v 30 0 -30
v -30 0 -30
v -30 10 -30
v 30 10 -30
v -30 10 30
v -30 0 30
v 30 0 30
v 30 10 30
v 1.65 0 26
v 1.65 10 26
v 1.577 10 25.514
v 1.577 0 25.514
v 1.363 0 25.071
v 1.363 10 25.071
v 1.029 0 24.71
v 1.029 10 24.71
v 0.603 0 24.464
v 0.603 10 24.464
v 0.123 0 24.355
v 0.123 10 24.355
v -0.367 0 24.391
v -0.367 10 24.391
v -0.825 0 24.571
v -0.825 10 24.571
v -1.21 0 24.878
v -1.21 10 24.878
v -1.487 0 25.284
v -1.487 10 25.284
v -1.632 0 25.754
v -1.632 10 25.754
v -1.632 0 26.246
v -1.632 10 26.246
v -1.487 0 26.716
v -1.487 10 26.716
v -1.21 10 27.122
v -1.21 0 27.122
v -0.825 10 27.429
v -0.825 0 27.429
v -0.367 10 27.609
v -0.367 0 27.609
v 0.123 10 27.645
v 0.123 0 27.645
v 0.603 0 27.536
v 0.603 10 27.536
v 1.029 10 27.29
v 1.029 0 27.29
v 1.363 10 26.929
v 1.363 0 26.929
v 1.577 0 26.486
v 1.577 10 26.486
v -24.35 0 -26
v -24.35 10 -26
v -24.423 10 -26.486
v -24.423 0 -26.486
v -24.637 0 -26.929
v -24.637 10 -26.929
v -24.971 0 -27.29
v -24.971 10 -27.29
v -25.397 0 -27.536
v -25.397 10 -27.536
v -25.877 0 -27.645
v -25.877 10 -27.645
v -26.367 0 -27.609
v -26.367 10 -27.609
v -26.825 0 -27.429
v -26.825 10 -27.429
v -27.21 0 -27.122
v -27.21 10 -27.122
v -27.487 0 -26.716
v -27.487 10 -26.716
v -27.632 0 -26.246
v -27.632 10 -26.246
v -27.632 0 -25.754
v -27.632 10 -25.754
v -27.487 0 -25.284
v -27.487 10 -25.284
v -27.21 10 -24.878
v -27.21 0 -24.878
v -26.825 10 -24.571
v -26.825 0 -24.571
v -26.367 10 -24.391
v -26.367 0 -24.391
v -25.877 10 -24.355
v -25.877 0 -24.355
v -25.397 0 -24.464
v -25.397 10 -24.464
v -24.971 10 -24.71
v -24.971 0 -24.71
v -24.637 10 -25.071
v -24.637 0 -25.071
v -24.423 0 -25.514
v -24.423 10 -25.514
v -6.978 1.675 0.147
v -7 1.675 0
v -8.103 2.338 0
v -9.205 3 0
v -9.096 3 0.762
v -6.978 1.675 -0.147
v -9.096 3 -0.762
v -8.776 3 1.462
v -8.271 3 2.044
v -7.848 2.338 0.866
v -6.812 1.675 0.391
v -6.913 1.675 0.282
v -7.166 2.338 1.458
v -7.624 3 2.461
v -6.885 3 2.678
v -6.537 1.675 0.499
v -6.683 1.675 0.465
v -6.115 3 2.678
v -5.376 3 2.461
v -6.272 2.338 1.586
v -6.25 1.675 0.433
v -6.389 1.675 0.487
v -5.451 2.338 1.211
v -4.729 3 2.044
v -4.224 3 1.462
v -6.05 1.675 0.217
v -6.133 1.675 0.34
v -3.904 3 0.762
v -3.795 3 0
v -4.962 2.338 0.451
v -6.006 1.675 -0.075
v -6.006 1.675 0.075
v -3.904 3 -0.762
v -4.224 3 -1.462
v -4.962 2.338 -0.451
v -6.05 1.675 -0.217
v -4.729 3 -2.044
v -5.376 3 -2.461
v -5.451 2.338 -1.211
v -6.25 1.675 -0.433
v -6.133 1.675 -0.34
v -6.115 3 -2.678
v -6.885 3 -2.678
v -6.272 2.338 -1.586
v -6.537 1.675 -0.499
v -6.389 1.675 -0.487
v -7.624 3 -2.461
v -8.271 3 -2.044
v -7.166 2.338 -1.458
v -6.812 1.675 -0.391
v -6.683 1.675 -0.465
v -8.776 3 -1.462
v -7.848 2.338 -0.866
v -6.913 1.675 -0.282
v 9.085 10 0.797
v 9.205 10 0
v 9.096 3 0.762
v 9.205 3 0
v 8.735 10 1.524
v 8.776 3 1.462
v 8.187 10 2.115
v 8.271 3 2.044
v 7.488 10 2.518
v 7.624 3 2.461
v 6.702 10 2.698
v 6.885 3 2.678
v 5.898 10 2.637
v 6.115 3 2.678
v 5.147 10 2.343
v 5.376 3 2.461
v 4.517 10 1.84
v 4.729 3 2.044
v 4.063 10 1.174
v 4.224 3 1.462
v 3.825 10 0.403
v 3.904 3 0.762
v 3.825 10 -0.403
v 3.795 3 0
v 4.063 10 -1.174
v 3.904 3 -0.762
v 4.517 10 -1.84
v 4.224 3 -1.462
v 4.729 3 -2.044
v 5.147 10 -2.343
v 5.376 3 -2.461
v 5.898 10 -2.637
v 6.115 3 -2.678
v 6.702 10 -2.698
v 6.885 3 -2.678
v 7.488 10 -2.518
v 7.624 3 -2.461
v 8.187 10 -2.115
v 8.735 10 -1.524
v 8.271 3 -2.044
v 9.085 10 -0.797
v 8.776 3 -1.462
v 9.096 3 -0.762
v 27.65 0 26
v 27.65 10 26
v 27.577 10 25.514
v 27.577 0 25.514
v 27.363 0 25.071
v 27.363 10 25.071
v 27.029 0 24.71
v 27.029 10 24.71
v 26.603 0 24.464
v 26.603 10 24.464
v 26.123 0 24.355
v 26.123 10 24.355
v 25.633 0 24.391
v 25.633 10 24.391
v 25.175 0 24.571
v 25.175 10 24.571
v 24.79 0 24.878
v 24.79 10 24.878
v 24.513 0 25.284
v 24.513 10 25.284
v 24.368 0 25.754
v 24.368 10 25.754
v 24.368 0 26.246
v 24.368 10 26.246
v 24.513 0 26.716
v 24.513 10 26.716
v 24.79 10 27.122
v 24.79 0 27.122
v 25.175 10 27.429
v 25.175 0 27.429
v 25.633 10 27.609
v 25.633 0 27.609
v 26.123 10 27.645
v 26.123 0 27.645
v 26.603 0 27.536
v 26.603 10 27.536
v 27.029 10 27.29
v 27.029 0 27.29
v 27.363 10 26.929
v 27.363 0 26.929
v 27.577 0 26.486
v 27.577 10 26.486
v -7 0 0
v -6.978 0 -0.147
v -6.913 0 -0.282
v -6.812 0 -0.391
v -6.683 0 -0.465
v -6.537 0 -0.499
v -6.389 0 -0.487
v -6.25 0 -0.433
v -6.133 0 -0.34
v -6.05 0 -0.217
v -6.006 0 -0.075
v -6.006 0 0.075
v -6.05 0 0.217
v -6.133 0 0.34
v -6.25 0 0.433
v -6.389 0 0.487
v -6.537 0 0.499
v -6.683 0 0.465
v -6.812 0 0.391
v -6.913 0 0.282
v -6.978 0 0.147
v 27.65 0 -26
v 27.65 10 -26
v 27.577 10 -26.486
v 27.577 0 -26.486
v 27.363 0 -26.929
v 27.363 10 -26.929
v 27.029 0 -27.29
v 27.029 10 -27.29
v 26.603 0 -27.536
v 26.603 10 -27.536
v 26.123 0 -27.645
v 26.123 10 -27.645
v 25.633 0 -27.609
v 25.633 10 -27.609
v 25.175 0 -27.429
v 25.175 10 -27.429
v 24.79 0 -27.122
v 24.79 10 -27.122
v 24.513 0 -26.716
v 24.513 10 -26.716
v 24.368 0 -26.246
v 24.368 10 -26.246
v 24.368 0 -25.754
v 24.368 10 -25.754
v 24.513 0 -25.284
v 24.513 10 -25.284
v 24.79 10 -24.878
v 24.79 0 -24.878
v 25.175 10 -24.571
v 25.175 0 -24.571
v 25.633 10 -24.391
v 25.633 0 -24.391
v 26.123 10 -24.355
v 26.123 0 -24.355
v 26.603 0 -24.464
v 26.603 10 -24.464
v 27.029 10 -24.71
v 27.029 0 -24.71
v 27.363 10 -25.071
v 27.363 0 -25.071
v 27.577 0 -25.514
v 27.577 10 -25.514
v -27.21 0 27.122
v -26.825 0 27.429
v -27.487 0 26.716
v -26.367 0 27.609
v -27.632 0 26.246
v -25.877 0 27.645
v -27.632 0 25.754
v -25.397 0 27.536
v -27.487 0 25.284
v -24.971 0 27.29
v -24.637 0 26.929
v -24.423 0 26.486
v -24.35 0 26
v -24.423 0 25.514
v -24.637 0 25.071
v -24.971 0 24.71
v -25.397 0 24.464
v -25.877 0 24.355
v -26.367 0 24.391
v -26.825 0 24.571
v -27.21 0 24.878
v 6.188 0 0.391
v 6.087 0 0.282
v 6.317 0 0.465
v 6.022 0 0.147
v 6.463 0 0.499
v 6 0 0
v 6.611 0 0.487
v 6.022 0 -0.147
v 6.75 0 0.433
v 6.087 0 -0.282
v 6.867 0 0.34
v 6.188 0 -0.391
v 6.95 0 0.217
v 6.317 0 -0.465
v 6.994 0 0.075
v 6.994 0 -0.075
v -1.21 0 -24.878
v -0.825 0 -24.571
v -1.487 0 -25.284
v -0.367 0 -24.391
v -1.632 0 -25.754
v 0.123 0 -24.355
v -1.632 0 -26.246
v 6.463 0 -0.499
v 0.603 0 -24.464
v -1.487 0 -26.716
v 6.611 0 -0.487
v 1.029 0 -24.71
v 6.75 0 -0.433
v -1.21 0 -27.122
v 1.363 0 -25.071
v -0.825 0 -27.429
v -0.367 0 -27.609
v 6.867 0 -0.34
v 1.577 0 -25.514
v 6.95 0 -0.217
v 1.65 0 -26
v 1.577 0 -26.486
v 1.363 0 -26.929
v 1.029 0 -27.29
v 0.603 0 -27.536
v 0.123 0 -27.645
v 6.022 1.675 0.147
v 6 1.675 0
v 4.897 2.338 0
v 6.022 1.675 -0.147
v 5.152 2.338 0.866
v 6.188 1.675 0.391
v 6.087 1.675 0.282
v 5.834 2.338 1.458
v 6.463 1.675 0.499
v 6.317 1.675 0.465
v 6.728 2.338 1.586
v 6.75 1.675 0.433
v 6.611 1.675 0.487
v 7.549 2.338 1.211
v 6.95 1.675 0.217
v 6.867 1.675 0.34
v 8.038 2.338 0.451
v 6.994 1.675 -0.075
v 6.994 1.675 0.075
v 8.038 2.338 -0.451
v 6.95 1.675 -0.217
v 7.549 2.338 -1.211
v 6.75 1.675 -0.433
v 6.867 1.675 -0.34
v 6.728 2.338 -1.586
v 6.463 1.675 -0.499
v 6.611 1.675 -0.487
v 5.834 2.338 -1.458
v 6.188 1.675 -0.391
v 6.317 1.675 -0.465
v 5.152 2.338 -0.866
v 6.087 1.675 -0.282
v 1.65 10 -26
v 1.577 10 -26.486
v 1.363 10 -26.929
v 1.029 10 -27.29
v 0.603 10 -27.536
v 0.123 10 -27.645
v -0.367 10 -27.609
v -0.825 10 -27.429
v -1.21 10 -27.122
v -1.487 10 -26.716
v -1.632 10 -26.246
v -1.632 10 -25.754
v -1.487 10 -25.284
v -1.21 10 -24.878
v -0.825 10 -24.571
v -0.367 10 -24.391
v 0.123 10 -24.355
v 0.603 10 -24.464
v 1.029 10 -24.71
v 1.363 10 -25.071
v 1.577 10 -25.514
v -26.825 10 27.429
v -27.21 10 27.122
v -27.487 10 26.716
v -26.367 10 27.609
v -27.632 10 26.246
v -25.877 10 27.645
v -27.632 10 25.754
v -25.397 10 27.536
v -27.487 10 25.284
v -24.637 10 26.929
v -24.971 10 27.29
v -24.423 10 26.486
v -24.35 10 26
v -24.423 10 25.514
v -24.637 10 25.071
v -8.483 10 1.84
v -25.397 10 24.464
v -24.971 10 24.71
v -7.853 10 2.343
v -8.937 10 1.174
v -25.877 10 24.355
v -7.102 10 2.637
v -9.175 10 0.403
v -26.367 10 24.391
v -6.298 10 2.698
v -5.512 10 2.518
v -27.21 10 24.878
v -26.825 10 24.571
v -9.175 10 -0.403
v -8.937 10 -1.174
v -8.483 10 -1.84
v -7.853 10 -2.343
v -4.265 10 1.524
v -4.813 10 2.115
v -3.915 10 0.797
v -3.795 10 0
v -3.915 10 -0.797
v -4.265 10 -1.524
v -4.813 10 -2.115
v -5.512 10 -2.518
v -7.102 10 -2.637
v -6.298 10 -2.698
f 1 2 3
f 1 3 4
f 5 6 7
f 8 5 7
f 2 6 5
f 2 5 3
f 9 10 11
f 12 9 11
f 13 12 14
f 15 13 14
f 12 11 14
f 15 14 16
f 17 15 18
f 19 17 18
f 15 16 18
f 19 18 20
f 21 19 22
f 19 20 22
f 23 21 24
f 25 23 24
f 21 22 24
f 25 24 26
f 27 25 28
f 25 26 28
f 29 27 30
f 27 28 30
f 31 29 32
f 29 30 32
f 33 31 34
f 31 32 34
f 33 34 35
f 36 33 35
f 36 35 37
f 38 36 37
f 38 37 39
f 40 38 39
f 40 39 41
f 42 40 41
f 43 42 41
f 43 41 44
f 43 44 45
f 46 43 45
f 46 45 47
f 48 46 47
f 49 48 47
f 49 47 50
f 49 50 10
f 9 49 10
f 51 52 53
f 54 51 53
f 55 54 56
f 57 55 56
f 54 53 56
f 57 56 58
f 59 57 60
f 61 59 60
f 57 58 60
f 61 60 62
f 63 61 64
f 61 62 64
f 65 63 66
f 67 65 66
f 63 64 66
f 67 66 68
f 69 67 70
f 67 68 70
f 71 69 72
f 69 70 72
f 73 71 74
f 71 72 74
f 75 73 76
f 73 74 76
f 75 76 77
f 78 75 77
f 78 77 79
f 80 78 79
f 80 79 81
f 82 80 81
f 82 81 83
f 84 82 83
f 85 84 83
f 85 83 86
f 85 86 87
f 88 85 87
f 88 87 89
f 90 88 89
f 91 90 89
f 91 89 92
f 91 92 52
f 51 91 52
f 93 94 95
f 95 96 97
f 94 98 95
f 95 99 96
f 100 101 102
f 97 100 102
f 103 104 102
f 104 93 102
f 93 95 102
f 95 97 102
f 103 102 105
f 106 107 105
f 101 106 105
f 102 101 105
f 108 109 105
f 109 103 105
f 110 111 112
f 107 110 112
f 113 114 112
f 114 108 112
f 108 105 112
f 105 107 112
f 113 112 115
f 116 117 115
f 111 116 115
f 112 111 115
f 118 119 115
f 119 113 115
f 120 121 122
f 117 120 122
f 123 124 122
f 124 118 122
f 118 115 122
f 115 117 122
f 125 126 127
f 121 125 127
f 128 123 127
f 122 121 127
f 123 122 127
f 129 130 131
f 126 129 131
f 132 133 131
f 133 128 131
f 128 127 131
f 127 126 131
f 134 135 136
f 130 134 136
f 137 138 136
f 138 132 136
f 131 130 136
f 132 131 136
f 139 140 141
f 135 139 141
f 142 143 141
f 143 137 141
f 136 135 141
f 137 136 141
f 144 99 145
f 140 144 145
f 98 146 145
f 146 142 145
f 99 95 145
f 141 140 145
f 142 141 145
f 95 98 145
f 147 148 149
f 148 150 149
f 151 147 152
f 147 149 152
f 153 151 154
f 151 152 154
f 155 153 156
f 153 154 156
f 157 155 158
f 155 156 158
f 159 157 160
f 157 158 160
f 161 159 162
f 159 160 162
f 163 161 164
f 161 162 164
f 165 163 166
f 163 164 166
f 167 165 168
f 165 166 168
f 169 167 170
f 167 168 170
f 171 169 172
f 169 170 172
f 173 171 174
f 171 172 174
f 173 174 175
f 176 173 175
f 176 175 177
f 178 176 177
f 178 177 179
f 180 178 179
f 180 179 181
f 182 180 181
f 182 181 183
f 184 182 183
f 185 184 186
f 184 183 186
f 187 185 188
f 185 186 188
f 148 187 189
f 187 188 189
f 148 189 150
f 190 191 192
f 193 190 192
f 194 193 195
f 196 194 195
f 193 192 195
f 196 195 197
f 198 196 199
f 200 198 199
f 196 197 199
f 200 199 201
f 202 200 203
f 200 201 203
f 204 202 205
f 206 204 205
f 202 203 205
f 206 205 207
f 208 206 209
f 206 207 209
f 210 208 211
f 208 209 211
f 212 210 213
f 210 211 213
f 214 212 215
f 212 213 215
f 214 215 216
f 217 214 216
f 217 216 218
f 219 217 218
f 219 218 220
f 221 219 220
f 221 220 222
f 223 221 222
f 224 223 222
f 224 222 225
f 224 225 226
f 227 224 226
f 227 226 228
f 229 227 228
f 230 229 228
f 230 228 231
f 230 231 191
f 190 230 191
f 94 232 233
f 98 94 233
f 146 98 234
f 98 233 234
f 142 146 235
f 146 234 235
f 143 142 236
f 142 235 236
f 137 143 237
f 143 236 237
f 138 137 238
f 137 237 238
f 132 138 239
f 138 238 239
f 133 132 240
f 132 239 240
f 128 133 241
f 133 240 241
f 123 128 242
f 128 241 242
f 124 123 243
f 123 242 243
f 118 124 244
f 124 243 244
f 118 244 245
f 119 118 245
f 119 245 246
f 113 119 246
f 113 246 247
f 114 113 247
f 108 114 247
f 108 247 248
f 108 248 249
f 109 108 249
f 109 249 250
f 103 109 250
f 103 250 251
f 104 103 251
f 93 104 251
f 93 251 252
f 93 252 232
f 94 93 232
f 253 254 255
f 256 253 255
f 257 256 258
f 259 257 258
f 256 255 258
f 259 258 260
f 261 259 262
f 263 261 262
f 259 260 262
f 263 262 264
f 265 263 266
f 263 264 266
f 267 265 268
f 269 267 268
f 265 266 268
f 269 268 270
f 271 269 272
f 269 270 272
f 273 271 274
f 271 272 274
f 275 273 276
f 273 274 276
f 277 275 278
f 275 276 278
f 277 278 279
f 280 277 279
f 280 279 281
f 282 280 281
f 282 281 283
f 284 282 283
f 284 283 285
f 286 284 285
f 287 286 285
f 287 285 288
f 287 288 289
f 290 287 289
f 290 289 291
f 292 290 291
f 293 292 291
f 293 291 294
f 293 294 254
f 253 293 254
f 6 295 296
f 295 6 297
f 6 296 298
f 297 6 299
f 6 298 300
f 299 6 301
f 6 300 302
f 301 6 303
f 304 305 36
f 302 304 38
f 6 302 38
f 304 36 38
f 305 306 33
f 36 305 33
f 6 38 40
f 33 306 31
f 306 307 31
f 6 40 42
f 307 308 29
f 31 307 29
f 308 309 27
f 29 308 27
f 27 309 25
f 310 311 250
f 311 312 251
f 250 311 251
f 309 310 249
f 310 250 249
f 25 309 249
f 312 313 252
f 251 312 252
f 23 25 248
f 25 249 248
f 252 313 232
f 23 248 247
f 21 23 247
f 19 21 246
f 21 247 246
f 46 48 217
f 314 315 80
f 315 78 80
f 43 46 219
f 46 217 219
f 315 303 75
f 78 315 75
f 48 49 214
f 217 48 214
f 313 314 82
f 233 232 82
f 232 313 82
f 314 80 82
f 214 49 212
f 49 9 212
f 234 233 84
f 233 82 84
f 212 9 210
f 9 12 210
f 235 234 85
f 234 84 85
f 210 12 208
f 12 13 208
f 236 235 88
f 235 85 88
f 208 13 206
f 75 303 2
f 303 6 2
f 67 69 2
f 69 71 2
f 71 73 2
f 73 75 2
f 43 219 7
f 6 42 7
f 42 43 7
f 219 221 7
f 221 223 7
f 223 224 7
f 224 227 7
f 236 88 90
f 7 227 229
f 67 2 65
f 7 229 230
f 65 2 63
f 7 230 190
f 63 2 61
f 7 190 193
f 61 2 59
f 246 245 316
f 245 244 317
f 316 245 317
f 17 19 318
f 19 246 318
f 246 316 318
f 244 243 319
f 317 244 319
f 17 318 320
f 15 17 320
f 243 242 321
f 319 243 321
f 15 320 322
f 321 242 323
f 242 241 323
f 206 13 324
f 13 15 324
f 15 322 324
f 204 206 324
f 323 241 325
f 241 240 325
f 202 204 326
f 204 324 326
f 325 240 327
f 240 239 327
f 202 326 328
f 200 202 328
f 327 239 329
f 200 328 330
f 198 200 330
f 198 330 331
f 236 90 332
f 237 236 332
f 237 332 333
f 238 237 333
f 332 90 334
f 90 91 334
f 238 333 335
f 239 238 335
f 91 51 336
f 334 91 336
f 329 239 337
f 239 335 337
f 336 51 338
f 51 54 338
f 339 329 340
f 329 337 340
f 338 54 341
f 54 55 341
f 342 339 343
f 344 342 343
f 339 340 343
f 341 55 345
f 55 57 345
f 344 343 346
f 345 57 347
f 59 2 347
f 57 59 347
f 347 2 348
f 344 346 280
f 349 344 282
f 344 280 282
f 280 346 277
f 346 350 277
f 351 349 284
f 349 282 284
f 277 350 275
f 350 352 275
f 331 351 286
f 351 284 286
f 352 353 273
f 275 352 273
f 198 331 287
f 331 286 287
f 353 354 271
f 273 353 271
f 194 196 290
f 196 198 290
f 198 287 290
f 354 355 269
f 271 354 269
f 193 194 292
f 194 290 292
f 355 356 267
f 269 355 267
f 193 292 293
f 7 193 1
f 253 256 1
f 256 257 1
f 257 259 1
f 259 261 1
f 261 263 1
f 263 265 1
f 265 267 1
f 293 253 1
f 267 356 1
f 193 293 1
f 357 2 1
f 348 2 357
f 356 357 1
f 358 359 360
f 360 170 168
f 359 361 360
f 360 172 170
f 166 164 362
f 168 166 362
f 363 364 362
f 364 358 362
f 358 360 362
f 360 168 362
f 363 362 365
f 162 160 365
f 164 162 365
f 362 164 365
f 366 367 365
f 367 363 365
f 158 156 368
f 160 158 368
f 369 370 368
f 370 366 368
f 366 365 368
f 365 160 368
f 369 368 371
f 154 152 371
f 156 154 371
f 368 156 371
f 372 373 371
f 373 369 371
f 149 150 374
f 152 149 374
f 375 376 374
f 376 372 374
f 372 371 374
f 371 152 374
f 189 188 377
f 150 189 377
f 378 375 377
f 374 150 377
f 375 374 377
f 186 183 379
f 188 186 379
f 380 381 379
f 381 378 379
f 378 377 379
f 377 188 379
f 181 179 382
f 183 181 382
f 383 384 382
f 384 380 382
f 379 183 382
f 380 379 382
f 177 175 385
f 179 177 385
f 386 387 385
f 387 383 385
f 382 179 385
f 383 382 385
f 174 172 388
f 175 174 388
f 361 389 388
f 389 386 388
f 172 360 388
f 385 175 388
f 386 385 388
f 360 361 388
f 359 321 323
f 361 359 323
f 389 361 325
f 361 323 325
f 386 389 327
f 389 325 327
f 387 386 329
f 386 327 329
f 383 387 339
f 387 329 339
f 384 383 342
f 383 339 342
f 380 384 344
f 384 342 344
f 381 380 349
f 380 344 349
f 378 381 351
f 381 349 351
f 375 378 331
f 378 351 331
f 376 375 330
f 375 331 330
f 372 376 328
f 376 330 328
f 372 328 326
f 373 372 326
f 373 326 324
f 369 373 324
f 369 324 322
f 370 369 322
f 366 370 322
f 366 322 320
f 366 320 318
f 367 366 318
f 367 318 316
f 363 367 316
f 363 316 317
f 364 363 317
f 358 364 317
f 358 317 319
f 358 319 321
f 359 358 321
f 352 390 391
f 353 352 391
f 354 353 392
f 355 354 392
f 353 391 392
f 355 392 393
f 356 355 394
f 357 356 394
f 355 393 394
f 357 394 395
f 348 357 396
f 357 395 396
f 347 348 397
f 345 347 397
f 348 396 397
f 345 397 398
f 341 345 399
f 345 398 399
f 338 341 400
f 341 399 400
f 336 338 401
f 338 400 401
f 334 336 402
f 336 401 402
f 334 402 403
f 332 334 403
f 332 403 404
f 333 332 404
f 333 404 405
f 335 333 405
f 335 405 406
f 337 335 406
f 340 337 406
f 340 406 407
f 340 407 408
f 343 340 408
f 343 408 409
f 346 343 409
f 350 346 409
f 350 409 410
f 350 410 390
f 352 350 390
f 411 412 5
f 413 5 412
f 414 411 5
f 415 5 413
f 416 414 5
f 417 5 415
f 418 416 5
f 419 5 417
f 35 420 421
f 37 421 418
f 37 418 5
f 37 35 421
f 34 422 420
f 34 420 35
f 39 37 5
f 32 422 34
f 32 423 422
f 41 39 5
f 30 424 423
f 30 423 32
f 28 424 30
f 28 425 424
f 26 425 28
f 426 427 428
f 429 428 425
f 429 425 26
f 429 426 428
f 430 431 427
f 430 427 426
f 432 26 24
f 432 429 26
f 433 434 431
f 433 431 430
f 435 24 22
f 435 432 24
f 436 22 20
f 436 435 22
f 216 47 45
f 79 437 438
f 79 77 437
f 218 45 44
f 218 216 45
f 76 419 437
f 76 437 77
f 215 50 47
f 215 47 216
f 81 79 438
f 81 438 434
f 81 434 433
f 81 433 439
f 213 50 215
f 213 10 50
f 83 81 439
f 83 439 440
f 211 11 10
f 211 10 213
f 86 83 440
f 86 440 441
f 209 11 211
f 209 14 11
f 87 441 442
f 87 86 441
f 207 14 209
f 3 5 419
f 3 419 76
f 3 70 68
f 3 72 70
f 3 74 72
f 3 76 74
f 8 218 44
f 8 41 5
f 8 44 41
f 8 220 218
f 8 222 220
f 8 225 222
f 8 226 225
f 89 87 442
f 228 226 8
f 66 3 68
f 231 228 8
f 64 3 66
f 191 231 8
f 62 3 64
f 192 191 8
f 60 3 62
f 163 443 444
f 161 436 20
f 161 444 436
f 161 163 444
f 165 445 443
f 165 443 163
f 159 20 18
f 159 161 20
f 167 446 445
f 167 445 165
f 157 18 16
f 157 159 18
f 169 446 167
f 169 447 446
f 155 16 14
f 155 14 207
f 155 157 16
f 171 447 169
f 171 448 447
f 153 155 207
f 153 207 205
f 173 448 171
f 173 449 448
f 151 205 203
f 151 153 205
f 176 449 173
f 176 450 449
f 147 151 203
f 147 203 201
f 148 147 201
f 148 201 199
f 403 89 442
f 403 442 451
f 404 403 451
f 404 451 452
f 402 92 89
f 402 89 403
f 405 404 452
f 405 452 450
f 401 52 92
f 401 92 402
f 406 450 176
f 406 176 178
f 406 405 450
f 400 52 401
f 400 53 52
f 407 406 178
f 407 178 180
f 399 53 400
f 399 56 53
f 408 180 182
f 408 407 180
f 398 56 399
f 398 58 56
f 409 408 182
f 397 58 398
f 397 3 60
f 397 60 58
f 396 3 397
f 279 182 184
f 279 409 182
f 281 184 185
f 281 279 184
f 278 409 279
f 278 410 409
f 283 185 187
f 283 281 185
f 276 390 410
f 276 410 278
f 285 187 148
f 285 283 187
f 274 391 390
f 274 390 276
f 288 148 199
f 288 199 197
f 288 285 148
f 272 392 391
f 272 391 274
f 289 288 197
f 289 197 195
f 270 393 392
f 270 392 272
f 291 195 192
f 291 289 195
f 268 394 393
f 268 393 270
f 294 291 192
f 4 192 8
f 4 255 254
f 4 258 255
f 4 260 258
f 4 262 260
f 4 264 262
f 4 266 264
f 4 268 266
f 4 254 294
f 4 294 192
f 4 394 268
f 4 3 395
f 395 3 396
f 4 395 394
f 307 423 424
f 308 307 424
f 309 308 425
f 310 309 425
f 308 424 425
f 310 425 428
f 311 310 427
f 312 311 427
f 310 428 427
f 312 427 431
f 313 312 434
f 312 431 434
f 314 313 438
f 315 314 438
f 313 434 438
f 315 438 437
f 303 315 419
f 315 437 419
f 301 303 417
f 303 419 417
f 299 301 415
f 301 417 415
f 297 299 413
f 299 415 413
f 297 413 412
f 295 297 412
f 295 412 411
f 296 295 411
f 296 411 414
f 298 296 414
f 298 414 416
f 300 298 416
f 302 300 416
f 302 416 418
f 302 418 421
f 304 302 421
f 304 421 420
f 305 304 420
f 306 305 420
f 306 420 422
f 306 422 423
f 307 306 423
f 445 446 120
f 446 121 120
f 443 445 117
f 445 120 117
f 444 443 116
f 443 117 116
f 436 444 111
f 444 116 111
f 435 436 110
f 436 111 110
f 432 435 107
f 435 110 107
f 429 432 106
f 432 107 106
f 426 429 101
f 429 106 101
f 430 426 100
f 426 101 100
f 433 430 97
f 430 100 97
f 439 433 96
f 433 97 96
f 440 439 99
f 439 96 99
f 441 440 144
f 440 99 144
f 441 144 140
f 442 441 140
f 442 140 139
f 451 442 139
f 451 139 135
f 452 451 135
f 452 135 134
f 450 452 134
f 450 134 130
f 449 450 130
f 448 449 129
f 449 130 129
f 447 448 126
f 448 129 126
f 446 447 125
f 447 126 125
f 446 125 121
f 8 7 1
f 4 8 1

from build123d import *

# Parameters (mm, degrees)
SKETCH2_W                       = 60
SKETCH2_H                       = 60
BOSS_EXTRUDE1_DEPTH             = 10
TAP_DRILL_FOR_M4X0_7_TAP1_D     = 3.3
TAP_DRILL_FOR_M4X0_7_TAP1_DEPTH = 10
F_1_4_28_TAPPED_HOLE5_D         = 5.4102
F_1_4_28_TAPPED_HOLE5_DEPTH     = 7
F_1_4_28_TAPPED_HOLE5_TIP       = 1.625388061
F_1_0MM_DOWEL_HOLE1_D           = 1


with BuildPart() as part:
    # Sketch2 → Boss-Extrude1 (new body)
    with BuildSketch(Plane(origin=(0, 0, 0), x_dir=(1, 0, 0), z_dir=(0, 1, 0))):
        Rectangle(SKETCH2_W, SKETCH2_H)
    extrude(amount=BOSS_EXTRUDE1_DEPTH)

    # Tap Drill for M4x0.7 Tap1
    with Locations(Plane(origin=(0, 0, 0), x_dir=(-1, 0, 0), z_dir=(0, -1, 0))):
        with Locations((0, 26), (26, 26), (-26, 26), (-26, -26), (0, -26), (26, -26)):
            Hole(TAP_DRILL_FOR_M4X0_7_TAP1_D / 2, depth=TAP_DRILL_FOR_M4X0_7_TAP1_DEPTH)

    # 1/4-28 Tapped Hole5
    with Locations(Plane(origin=(0, 10, 0), x_dir=(-1, 0, 0), z_dir=(0, 1, 0))):
        with Locations((6.5, 0), (-6.5, 0)):
            Hole(F_1_4_28_TAPPED_HOLE5_D / 2, depth=F_1_4_28_TAPPED_HOLE5_DEPTH)
            with Locations((0, 0, -(F_1_4_28_TAPPED_HOLE5_DEPTH + F_1_4_28_TAPPED_HOLE5_TIP / 2))):  # 118° drill point
                Cone(0, F_1_4_28_TAPPED_HOLE5_D / 2, F_1_4_28_TAPPED_HOLE5_TIP, mode=Mode.SUBTRACT)

    # Ø1.0mm Dowel Hole1 (through all)
    with Locations(Plane(origin=(0, 10, 0), x_dir=(1, 0, 0), z_dir=(0, 1, 0))):
        with Locations((-6.5, 0), (6.5, 0)):
            Hole(F_1_0MM_DOWEL_HOLE1_D / 2)


solid = part.part
